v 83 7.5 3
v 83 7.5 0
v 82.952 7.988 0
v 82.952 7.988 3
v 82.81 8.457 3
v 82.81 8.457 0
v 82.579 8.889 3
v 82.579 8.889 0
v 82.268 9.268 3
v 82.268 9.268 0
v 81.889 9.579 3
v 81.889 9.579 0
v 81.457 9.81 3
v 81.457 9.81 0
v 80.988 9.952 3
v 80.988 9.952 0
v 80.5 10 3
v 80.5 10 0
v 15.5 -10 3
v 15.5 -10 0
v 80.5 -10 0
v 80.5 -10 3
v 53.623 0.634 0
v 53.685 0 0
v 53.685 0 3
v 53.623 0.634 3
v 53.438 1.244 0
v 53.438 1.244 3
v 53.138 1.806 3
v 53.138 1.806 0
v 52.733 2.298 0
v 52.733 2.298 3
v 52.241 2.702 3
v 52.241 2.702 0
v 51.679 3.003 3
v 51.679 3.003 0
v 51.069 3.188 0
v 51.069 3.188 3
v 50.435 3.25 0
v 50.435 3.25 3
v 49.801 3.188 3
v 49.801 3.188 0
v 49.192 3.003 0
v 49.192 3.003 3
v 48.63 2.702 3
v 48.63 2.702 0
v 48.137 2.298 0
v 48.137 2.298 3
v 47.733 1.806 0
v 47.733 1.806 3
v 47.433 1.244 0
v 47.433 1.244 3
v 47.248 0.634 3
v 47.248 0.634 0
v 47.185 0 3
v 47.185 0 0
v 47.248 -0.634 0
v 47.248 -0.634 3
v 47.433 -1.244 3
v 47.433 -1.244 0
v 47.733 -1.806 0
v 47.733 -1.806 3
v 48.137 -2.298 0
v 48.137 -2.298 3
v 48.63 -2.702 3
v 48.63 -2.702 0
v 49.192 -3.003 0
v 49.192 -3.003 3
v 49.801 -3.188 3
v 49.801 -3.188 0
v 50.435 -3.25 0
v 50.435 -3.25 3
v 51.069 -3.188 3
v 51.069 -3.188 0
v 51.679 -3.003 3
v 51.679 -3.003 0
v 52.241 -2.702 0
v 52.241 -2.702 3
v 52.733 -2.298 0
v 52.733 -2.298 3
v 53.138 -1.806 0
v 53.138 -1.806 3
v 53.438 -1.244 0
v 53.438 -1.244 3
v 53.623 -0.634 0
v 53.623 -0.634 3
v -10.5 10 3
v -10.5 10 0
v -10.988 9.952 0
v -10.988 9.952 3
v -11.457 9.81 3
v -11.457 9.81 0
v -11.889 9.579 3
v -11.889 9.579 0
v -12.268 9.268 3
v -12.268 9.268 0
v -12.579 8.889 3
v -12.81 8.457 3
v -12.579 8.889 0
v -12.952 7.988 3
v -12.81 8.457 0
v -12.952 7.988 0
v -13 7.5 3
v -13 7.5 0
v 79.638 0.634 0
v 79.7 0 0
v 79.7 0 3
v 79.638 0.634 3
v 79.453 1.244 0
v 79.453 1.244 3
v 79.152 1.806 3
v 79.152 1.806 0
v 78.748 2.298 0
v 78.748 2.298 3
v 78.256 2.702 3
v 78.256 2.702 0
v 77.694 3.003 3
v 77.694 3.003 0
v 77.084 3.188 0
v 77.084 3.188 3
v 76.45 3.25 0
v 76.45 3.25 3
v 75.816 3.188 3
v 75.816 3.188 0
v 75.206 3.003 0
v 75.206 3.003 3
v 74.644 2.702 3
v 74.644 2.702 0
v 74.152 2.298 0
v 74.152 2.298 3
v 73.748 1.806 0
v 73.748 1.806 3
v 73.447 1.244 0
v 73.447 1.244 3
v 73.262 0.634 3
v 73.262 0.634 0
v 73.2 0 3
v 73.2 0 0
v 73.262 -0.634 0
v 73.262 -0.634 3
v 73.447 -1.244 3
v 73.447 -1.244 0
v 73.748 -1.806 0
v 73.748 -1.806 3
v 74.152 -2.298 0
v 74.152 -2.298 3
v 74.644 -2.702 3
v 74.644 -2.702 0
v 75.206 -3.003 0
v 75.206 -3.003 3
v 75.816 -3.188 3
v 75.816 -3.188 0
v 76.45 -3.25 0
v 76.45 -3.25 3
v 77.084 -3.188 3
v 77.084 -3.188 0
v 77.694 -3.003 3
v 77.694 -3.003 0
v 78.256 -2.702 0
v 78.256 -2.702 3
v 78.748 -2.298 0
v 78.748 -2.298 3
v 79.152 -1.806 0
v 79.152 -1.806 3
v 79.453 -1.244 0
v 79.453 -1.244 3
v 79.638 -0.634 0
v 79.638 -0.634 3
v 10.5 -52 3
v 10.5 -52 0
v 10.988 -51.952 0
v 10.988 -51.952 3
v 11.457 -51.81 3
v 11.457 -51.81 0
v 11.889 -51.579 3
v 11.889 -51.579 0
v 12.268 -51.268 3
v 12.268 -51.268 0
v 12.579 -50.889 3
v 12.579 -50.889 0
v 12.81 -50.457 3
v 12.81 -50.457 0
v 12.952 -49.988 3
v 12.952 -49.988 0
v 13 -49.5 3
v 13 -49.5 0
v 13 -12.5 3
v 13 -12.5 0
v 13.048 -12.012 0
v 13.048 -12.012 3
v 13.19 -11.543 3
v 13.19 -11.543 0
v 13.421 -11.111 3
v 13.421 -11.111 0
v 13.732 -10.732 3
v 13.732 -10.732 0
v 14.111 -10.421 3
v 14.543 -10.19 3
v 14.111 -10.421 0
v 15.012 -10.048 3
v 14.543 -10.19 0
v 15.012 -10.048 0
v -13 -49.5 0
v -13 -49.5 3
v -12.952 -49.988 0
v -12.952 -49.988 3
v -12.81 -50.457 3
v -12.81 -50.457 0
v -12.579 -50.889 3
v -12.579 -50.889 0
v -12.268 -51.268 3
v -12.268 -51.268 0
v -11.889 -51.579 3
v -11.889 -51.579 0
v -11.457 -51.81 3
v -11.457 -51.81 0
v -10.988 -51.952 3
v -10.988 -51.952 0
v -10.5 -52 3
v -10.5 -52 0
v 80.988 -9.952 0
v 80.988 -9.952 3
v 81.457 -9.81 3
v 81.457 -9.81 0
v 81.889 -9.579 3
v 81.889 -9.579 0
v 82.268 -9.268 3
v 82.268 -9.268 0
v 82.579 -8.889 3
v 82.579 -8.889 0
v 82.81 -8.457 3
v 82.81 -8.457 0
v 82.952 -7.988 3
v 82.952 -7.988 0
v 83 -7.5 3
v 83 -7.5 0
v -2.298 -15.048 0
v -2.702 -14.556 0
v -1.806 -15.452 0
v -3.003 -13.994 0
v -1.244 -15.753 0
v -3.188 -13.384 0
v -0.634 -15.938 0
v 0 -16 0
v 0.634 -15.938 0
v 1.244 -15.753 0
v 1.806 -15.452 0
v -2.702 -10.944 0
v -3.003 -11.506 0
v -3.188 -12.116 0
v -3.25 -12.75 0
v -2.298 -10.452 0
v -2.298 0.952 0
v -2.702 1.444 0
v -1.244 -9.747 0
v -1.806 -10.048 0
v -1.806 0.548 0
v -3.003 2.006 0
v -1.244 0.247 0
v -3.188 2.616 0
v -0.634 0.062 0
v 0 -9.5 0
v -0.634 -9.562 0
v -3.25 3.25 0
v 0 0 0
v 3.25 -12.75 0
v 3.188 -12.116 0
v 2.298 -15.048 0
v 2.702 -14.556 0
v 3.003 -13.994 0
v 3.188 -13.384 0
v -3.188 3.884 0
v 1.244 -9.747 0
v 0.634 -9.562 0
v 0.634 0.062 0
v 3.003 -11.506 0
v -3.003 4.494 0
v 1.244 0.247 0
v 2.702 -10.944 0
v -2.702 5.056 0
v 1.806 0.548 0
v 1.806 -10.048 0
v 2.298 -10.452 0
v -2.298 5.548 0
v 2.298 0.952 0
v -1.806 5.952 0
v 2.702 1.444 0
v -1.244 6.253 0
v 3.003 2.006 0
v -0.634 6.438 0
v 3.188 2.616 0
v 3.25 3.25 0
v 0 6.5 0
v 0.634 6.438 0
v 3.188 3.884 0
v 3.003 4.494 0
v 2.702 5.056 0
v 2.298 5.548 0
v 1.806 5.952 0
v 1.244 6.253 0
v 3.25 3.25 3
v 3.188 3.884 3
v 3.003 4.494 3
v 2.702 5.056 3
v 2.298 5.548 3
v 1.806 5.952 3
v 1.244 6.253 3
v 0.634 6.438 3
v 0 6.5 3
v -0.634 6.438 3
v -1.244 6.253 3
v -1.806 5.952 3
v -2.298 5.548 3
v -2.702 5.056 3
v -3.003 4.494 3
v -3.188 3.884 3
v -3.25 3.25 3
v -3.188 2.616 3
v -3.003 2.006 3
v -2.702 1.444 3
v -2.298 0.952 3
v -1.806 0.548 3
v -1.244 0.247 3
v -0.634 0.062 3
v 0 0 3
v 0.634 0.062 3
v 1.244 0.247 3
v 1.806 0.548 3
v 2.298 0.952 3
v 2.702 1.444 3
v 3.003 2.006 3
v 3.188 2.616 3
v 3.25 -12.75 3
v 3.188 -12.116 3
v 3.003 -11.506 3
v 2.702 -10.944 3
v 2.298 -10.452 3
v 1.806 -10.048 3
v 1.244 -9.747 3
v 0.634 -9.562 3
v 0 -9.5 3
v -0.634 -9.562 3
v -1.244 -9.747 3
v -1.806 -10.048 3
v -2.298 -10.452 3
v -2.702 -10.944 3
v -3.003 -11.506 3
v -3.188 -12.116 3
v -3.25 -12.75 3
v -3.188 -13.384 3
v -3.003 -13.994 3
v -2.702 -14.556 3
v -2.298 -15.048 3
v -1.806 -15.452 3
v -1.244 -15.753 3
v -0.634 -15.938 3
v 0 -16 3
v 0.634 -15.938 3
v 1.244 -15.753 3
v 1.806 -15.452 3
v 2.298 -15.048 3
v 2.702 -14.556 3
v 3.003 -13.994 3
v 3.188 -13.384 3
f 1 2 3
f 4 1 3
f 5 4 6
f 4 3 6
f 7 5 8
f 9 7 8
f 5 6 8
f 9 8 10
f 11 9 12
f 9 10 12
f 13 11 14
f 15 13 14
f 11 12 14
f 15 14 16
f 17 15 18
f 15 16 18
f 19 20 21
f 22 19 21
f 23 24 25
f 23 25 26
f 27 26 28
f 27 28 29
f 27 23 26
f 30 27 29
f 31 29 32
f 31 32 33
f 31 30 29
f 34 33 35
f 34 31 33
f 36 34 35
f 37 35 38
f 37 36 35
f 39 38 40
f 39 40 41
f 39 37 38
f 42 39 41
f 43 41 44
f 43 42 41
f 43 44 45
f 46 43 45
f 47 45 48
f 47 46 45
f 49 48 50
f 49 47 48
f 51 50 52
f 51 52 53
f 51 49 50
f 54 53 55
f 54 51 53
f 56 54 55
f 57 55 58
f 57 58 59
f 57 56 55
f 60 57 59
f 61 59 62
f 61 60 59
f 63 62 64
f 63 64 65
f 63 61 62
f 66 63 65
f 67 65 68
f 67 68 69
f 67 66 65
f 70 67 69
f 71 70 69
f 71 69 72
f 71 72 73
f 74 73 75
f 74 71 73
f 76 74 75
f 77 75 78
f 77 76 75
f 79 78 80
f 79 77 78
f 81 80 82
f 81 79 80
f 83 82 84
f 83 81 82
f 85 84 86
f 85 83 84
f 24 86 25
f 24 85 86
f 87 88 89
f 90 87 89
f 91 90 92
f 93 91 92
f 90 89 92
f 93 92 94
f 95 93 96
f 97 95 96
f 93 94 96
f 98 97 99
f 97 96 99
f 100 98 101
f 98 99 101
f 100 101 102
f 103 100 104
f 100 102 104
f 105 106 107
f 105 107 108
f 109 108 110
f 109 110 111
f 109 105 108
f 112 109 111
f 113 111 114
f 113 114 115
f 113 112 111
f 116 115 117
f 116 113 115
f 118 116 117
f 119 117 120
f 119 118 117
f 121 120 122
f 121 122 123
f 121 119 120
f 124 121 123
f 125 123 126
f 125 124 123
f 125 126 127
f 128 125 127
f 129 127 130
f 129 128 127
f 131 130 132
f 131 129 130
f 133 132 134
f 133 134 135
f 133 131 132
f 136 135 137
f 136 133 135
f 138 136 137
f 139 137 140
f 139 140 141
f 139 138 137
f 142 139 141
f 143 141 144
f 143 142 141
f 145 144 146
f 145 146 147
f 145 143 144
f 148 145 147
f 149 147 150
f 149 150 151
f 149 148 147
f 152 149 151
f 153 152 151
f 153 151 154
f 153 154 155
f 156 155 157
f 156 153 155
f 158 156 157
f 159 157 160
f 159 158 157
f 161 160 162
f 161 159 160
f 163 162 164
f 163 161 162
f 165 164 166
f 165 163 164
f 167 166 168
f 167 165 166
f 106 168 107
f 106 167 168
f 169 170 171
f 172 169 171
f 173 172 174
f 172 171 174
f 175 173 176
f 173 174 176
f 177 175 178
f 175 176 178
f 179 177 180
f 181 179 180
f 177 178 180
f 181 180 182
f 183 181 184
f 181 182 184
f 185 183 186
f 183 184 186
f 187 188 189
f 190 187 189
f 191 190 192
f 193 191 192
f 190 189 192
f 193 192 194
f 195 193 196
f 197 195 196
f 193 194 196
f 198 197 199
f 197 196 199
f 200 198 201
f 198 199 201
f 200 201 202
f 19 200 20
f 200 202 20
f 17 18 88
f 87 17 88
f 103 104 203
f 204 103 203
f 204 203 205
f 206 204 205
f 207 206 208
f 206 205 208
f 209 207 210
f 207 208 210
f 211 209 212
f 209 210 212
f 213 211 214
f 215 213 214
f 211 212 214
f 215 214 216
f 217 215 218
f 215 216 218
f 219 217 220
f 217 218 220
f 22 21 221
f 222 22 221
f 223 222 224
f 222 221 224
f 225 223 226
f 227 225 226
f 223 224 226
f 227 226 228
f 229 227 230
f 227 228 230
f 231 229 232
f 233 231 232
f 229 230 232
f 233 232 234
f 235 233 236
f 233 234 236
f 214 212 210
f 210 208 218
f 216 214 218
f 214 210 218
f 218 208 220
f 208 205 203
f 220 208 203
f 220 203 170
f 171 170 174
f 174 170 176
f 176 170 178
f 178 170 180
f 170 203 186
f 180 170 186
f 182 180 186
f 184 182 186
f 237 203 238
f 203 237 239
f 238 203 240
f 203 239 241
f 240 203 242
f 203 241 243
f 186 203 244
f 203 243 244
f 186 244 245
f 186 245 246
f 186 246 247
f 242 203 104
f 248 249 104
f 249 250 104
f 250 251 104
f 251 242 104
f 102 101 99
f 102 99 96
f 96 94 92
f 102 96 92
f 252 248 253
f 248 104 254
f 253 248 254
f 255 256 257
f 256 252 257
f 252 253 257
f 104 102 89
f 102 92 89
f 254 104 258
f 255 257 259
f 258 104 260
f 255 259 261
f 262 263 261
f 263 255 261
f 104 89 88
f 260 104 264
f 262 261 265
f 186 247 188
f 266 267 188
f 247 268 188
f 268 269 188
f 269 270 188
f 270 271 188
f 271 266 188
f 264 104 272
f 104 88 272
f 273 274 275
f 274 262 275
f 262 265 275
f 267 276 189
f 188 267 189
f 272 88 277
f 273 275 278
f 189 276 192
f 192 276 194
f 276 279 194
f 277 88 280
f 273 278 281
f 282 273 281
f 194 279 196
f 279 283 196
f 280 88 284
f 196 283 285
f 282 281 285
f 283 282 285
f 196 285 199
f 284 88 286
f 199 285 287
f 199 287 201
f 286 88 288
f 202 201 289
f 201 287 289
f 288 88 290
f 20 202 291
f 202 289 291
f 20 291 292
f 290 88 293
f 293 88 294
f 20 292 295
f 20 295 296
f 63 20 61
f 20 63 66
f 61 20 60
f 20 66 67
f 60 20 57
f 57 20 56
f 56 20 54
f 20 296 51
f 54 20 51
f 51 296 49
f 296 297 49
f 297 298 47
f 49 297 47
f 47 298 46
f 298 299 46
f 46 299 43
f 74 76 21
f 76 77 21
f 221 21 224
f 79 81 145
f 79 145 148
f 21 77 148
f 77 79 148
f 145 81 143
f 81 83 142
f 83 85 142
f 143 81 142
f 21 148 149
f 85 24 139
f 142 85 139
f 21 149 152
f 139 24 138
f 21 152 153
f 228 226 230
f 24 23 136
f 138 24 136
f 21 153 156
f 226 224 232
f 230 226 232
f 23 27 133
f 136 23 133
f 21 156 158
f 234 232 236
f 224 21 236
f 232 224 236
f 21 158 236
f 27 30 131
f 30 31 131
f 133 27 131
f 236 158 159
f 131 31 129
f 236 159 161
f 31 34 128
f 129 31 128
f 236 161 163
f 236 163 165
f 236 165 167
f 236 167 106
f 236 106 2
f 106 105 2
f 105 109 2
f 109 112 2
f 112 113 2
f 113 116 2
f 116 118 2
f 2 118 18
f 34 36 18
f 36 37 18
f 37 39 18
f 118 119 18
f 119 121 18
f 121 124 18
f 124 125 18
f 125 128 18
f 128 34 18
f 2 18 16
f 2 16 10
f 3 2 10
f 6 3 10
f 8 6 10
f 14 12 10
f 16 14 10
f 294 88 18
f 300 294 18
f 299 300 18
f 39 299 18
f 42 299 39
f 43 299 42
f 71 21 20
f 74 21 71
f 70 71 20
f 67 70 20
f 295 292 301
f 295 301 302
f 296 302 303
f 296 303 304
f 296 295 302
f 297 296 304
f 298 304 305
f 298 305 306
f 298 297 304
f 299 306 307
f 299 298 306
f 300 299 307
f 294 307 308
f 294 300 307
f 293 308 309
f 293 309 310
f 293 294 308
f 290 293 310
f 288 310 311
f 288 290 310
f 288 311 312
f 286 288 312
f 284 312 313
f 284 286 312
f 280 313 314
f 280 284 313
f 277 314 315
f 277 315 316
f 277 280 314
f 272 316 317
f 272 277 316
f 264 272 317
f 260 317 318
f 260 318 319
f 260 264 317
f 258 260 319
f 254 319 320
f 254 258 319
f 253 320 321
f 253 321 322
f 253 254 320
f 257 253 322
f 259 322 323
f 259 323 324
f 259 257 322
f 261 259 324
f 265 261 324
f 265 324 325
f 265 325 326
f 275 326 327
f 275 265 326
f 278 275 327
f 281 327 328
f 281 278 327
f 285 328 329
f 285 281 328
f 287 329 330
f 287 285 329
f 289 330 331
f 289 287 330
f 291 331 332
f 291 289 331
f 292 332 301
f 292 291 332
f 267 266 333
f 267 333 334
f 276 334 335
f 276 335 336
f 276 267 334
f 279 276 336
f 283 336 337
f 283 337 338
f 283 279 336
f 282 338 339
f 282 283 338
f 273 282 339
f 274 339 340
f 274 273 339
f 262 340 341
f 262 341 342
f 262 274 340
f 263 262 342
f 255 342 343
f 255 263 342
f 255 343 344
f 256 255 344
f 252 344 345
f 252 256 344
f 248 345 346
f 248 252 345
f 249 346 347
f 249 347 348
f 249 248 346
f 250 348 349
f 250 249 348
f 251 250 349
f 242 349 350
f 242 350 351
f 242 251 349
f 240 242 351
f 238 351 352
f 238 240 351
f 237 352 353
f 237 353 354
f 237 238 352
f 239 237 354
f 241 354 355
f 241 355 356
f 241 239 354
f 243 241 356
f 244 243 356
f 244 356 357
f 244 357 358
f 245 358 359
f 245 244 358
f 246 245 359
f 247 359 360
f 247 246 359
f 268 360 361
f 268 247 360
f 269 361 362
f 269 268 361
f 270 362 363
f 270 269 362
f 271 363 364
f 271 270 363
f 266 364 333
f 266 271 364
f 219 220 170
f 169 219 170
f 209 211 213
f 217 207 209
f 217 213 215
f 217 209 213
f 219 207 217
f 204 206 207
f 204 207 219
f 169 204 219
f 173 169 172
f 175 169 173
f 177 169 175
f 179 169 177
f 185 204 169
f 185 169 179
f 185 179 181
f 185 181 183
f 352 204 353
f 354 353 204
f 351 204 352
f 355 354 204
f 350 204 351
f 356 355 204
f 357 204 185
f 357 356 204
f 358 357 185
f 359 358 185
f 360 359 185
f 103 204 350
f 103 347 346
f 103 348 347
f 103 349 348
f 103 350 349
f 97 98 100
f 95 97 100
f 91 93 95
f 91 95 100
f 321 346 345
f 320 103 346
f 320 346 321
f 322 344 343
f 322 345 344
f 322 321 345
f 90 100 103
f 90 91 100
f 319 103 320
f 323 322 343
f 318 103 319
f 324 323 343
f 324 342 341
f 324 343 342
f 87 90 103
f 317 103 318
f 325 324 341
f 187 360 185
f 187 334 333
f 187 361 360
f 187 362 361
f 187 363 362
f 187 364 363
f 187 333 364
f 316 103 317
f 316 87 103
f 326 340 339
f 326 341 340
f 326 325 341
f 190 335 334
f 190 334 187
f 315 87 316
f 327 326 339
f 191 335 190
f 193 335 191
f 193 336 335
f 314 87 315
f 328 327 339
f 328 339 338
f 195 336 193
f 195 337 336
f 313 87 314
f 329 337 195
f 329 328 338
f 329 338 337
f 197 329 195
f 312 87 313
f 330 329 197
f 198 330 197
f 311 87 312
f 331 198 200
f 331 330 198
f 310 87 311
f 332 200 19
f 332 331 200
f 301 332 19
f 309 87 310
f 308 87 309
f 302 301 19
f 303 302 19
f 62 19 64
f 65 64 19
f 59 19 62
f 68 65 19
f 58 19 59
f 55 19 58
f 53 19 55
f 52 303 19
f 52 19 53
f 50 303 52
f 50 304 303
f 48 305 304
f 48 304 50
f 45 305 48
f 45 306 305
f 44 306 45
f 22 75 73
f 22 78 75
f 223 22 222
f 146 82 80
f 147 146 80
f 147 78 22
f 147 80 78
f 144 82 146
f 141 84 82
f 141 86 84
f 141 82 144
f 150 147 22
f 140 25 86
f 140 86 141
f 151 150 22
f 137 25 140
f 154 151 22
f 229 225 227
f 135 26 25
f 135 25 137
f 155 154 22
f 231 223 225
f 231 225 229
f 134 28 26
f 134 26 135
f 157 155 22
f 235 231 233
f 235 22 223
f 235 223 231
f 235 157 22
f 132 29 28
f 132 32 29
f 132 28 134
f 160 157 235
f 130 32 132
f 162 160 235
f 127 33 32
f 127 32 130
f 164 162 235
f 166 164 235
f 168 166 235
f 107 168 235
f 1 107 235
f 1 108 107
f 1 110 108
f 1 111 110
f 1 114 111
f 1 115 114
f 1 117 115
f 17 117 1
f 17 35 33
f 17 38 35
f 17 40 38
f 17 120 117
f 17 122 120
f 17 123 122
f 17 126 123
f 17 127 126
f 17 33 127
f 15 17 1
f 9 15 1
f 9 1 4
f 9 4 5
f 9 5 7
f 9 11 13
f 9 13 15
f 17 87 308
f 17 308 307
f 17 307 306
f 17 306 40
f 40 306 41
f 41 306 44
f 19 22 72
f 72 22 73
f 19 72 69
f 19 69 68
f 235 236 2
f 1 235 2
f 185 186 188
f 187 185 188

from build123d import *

# Parameters (mm, degrees)
F0_R     = 3.25
F1_DEPTH = 3


with BuildPart() as f1:
    # F0 (on Top) → F1 (new body)
    with BuildSketch(Plane.XY):
        with BuildLine():
            Line((80.5, 10), (13, 10))
            Line((13, 10), (-10.5, 10))
            ThreePointArc((-10.5, 10), (-12.267767, 9.267767), (-13, 7.5))
            Line((-13, 7.5), (-13, -49.5))
            ThreePointArc((-13, -49.5), (-12.267767, -51.267767), (-10.5, -52))
            Line((-10.5, -52), (10.5, -52))
            ThreePointArc((10.5, -52), (12.267767, -51.267767), (13, -49.5))
            Line((13, -49.5), (13, -12.5))
            ThreePointArc((13, -12.5), (13.732233, -10.732233), (15.5, -10))
            Line((15.5, -10), (80.5, -10))
            ThreePointArc((80.5, -10), (82.267767, -9.267767), (83, -7.5))
            Line((83, -7.5), (83, 7.5))
            ThreePointArc((83, 7.5), (82.267767, 9.267767), (80.5, 10))
        make_face()
        with Locations((0, -12.75)):
            Circle(F0_R, mode=Mode.SUBTRACT)
        with Locations((0, 3.25)):
            Circle(F0_R, mode=Mode.SUBTRACT)
        with Locations((50.435357, 0)):
            Circle(F0_R, mode=Mode.SUBTRACT)
        with Locations((76.45, 0)):
            Circle(F0_R, mode=Mode.SUBTRACT)
    extrude(amount=F1_DEPTH)


solid = f1.part
